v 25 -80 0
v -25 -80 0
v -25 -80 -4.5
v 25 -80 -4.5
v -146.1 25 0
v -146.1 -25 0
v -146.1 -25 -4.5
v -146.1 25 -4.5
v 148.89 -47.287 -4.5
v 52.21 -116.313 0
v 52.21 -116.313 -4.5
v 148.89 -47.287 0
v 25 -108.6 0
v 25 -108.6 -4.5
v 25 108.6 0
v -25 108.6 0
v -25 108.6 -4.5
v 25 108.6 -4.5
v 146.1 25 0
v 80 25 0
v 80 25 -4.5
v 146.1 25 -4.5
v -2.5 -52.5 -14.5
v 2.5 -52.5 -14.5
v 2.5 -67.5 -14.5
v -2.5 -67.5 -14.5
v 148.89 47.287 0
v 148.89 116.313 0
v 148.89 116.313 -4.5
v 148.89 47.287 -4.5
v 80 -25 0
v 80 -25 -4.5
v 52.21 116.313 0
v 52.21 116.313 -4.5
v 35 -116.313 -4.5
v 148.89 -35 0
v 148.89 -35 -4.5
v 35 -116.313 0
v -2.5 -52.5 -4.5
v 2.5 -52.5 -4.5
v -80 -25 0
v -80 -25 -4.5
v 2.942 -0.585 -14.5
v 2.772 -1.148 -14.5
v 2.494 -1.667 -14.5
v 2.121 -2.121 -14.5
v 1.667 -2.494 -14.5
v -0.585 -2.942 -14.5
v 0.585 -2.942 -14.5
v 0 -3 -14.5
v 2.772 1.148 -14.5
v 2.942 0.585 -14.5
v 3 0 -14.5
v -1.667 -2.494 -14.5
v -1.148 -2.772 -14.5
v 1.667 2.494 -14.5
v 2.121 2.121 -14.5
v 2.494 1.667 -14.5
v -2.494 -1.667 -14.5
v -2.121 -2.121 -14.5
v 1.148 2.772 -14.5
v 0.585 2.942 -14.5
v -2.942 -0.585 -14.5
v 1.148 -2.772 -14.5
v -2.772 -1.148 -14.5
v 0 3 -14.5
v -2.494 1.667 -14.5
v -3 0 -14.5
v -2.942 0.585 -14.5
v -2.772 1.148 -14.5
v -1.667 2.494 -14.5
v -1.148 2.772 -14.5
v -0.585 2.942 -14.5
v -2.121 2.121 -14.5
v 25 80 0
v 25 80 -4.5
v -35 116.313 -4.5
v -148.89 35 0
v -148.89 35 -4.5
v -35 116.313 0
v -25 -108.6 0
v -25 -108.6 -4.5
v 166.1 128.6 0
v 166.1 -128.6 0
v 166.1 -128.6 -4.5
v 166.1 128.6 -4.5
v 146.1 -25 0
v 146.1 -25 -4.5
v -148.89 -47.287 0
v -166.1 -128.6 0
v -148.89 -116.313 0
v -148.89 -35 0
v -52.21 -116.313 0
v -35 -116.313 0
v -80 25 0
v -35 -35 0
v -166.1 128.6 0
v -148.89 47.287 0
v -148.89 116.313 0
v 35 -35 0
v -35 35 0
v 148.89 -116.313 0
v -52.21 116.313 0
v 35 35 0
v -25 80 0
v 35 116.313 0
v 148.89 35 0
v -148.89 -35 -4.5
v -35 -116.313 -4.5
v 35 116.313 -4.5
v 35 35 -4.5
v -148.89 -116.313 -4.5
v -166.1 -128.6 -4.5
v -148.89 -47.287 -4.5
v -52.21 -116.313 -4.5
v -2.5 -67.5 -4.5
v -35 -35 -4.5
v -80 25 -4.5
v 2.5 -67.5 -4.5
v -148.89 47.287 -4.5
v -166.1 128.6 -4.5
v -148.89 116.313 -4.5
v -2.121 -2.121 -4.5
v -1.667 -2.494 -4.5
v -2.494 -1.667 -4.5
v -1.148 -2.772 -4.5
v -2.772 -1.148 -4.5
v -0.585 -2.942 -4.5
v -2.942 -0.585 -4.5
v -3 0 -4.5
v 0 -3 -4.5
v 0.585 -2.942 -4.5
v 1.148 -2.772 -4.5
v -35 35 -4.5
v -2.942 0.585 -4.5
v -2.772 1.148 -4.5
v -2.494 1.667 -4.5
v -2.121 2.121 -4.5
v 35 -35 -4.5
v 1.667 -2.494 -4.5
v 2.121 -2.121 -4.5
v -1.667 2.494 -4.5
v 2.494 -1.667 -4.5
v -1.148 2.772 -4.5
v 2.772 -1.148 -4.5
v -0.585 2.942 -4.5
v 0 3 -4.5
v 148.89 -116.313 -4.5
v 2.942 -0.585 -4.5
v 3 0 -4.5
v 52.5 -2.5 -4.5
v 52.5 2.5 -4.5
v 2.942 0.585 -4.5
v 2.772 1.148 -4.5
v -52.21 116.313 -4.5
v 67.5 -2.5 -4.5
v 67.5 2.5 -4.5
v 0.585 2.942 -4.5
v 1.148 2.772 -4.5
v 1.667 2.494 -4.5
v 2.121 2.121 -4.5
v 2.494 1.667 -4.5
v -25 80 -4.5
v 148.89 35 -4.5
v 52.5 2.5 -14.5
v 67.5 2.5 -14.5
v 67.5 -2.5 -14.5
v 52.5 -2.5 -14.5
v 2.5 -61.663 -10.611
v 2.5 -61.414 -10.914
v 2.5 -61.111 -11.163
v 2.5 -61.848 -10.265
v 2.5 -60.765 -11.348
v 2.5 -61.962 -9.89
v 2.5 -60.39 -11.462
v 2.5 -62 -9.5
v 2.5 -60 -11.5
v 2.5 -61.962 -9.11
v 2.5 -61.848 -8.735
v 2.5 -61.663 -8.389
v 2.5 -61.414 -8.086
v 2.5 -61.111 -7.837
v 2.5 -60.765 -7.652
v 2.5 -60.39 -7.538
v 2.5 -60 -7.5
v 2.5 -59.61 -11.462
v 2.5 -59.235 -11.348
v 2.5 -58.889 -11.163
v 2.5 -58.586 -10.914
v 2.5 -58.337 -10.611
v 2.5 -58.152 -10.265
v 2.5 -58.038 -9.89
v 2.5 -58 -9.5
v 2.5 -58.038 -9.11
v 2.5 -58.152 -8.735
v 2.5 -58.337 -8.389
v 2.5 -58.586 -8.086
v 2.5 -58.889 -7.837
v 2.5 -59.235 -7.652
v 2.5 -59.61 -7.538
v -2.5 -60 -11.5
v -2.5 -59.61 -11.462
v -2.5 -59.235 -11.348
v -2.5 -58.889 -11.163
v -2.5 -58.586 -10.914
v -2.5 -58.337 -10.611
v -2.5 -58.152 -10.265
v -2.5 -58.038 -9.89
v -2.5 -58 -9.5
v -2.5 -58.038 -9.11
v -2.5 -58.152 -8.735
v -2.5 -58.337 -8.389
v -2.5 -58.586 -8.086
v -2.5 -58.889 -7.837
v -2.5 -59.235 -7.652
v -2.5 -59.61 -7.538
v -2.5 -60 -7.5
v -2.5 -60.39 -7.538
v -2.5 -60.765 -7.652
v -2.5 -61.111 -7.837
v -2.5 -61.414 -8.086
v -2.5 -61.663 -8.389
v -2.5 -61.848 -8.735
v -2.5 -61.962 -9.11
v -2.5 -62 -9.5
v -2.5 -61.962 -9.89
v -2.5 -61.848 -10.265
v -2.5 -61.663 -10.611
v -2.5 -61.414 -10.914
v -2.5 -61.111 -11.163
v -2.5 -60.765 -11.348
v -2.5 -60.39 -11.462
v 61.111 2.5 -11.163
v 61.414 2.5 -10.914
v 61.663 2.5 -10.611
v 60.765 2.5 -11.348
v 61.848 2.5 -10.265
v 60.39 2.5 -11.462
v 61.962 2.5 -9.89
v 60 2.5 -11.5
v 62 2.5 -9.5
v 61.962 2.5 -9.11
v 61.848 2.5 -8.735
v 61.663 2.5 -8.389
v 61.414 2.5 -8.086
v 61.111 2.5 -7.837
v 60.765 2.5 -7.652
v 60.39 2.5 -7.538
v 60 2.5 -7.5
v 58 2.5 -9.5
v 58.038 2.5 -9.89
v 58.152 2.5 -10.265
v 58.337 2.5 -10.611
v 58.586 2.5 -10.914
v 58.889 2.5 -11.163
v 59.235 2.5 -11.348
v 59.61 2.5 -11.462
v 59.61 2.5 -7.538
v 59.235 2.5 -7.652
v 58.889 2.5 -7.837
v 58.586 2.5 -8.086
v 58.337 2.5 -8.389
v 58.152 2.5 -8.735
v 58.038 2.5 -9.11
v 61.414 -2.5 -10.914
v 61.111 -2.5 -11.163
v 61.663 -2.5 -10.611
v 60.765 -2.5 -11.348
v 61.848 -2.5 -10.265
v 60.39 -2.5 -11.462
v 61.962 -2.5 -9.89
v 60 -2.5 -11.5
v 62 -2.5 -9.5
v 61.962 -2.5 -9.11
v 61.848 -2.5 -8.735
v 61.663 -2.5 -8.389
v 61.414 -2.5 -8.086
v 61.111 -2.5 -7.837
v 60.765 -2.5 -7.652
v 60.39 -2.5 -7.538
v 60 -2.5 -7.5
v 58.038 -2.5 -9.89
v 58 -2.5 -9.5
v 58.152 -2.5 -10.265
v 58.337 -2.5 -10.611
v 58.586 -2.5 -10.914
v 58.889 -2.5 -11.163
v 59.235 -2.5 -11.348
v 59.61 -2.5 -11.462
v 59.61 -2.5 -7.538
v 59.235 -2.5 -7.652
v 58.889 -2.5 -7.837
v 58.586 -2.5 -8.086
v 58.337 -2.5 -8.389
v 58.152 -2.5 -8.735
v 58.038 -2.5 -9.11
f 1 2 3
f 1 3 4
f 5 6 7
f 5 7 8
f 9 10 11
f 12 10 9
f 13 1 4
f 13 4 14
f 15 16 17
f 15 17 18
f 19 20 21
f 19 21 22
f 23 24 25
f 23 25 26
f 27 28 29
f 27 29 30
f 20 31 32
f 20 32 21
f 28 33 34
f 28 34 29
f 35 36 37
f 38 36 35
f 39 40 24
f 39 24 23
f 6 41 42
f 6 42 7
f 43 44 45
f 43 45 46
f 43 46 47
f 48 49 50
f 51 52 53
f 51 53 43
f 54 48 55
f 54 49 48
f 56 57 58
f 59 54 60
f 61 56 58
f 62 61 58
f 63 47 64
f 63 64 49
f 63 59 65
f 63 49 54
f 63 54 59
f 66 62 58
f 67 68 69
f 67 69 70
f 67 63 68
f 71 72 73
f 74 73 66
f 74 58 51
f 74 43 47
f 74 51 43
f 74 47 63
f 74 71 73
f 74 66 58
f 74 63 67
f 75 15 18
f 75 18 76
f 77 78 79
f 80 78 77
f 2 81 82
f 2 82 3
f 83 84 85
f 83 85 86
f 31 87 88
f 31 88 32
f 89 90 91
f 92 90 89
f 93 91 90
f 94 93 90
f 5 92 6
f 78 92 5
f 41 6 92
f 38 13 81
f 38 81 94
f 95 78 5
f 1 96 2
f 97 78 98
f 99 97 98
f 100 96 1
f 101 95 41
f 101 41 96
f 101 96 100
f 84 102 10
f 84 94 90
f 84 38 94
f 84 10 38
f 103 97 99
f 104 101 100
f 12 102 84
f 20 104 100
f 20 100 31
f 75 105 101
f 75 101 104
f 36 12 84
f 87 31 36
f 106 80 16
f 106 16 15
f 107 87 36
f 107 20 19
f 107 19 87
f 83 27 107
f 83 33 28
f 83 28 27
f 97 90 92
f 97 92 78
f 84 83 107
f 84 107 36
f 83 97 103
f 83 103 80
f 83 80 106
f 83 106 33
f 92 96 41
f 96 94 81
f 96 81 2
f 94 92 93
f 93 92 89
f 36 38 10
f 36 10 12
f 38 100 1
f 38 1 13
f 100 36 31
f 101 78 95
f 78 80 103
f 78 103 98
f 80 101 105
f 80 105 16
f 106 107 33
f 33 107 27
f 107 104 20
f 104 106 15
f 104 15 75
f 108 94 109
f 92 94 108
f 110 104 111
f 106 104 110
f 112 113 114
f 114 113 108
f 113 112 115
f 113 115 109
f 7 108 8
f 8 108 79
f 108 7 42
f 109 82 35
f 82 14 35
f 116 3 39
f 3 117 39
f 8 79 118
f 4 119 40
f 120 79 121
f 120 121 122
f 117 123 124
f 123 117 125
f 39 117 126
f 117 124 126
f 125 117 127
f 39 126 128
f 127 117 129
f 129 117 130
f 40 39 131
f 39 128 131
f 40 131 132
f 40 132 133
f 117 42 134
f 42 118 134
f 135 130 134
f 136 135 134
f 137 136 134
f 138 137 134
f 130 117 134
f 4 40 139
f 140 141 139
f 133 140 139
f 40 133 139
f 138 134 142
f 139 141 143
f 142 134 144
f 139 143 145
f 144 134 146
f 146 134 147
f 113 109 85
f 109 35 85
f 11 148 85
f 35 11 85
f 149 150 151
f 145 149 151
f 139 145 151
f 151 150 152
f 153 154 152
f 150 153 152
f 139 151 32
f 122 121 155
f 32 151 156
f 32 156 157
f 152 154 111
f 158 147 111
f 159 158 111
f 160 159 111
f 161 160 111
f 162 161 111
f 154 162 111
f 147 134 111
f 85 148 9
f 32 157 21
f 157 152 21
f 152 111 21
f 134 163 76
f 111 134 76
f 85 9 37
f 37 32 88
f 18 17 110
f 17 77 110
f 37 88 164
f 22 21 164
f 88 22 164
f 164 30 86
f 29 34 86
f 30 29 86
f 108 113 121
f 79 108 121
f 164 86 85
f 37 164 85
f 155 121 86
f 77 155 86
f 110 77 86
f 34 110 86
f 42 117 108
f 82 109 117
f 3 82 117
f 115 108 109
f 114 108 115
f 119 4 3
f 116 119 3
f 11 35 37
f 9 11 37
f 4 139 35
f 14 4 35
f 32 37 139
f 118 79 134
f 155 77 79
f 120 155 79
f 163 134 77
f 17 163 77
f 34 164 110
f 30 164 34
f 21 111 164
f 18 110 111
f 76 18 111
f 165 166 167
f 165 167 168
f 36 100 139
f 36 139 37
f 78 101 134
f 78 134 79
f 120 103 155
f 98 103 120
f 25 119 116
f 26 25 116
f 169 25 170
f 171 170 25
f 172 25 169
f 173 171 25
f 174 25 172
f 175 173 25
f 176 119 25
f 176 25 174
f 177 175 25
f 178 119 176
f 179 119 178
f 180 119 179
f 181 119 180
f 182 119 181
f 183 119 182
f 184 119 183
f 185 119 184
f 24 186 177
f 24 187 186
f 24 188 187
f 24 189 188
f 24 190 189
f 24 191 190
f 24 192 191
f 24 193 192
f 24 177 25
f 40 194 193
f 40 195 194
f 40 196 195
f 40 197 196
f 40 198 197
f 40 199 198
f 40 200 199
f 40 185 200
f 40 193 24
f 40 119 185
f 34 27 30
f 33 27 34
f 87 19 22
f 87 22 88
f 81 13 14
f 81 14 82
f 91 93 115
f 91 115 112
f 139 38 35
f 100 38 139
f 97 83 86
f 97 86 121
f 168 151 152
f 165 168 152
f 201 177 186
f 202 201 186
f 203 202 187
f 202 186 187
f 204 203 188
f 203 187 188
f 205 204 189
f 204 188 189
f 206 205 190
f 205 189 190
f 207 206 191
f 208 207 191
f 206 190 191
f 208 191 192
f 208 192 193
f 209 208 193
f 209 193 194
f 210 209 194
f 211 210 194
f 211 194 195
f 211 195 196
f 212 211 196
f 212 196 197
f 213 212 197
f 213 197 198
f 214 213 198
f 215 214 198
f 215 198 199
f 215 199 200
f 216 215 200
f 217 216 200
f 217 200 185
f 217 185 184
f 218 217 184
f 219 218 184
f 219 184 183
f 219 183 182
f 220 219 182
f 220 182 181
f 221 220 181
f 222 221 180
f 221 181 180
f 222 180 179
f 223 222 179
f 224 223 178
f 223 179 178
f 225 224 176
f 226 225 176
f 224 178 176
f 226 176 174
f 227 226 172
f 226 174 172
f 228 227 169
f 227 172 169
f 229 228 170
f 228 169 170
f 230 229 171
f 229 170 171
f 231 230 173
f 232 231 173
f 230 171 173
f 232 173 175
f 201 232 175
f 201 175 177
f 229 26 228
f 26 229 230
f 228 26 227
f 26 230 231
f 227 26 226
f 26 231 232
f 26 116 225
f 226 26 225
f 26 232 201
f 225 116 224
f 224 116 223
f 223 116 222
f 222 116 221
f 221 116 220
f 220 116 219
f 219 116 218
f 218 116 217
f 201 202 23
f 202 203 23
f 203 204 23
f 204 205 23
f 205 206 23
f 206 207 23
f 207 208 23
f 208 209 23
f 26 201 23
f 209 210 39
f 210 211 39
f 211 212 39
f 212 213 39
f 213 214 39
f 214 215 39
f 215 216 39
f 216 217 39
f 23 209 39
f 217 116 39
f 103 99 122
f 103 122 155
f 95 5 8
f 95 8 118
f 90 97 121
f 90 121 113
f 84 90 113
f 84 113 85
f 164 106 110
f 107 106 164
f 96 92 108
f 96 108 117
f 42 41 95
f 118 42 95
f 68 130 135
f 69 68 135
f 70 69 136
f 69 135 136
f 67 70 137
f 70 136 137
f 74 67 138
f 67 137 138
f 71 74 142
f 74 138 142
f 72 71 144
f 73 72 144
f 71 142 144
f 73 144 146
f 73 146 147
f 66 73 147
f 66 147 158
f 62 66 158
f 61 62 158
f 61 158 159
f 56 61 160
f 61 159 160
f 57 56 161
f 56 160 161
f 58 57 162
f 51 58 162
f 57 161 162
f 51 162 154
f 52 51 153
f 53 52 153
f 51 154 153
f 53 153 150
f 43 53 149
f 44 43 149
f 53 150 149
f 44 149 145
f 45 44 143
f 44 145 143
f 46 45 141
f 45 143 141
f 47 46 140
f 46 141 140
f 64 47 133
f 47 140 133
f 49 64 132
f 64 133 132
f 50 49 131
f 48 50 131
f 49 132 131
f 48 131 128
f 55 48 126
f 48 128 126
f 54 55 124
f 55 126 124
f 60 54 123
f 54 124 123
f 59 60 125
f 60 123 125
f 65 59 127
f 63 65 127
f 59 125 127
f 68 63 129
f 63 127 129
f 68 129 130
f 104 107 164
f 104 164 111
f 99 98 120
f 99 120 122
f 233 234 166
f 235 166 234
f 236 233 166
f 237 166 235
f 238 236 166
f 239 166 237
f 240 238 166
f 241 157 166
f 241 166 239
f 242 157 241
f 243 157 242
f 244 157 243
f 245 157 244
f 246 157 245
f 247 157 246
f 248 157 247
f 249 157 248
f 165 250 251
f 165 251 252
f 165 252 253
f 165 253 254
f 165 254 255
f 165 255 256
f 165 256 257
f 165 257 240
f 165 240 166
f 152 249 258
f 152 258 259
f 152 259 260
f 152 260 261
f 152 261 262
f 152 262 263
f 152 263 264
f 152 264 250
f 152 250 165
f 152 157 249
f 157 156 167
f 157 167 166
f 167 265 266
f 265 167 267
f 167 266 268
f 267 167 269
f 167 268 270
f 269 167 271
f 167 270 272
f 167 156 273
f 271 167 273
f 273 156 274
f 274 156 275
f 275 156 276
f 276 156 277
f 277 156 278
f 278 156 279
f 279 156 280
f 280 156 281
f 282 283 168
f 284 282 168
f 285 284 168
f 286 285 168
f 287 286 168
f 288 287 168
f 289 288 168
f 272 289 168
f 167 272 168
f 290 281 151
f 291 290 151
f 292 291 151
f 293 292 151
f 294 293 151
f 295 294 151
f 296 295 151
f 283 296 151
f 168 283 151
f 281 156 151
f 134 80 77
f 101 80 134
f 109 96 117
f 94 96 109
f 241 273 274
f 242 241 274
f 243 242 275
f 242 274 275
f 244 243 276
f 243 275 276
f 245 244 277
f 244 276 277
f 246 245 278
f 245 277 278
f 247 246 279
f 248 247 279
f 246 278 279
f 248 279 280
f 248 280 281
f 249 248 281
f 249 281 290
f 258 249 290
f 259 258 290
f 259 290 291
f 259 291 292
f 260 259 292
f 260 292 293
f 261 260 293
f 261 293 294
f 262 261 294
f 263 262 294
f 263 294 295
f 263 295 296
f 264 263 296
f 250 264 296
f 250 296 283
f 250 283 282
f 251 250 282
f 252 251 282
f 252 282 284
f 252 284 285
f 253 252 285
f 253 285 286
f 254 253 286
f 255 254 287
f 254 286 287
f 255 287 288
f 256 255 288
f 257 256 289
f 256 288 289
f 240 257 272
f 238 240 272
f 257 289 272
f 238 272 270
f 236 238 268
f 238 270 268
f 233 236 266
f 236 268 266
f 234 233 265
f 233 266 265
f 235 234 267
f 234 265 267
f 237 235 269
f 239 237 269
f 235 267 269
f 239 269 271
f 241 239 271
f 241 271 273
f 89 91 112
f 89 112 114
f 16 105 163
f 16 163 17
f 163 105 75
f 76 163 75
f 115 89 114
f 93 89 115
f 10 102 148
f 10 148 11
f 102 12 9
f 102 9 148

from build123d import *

# Parameters (mm, degrees)
IZIM1_W                     = 50
IZIM1_H                     = 50
IZIM1_H_2                   = 45
IZIM1_W_2                   = 45
Y_KSEKLIK_EKSTR_ZYON2_DEPTH = 4.5
IZIM2_R                     = 3
Y_KSEKLIK_EKSTR_ZYON3_DEPTH = 10
IZIM4_W                     = 15
IZIM4_H                     = 5
IZIM4_W_2                   = 5
IZIM4_H_2                   = 15
Y_KSEKLIK_EKSTR_ZYON5_DEPTH = 10
IZIM5_R                     = 2
KES_EKSTR_ZYON1_DEPTH       = 132.1
IZIM6_R                     = 2
KES_EKSTR_ZYON2_DEPTH       = 169.6


with BuildPart() as part:
    # Çizim1 → Yükseklik-Ekstrüzyon2 (new body)
    with BuildSketch(Plane.XY):
        Polygon((-35, -128.6), (-35, -116.312863708), (-52.209867178, -116.312863708), align=None)
        Polygon((-35, -116.312863708), (-148.890132822, -35), (-148.890132822, -47.287136292), (-52.209867178, -116.312863708), align=None)
        Polygon((-25, -35), (-35, -35), (-35, -116.312863708), (-35, -128.6), (35, -128.6), (35, -116.312863708), (35, -35), (25, -35), (25, -80), (25, -108.6), (-25, -108.6), (-25, -80), align=None)
        Polygon((-148.890132822, -47.287136292), (-166.1, -35), (-166.1, -128.6), (-35, -128.6), (-52.209867178, -116.312863708), (-148.890132822, -116.312863708), align=None)
        Polygon((-148.890132822, -35), (-166.1, -35), (-148.890132822, -47.287136292), align=None)
        Polygon((-35, 25), (-35, 35), (-148.890132822, 35), (-166.1, 35), (-166.1, -35), (-148.890132822, -35), (-35, -35), (-35, -25), (-80, -25), (-146.1, -25), (-146.1, 25), (-80, 25), align=None)
        Polygon((-25, 35), (-35, 35), (-35, 25), (-35, -25), (-35, -35), (-25, -35), (25, -35), (35, -35), (35, -25), (35, 25), (35, 35), (25, 35), align=None)
        Rectangle(IZIM1_W, IZIM1_H, mode=Mode.SUBTRACT)
        with Locations((0, -57.5)):
            Rectangle(IZIM1_W, IZIM1_H_2)
        Rectangle(IZIM1_W, IZIM1_H)
        with Locations((-57.5, 0)):
            Rectangle(IZIM1_W_2, IZIM1_H)
        with Locations((57.5, 0)):
            Rectangle(IZIM1_W_2, IZIM1_H)
        Polygon((148.890132822, 35), (35, 35), (35, 25), (80, 25), (146.1, 25), (146.1, -25), (80, -25), (35, -25), (35, -35), (148.890132822, -35), (166.1, -35), (166.1, 35), align=None)
        Polygon((148.890132822, -47.287136292), (148.890132822, -35), (35, -116.312863708), (52.209867178, -116.312863708), align=None)
        Polygon((148.890132822, -47.287136292), (166.1, -35), (148.890132822, -35), align=None)
        Polygon((166.1, -128.6), (166.1, -35), (148.890132822, -47.287136292), (148.890132822, -116.312863708), (52.209867178, -116.312863708), (35, -128.6), align=None)
        Polygon((52.209867178, -116.312863708), (35, -116.312863708), (35, -128.6), align=None)
        Polygon((52.209867178, 116.312863708), (35, 116.312863708), (148.890132822, 35), (148.890132822, 47.287136292), align=None)
        Polygon((148.890132822, 47.287136292), (148.890132822, 35), (166.1, 35), align=None)
        Polygon((166.1, 128.6), (35, 128.6), (52.209867178, 116.312863708), (148.890132822, 116.312863708), (148.890132822, 47.287136292), (166.1, 35), align=None)
        Polygon((52.209867178, 116.312863708), (35, 128.6), (35, 116.312863708), align=None)
        Polygon((35, 128.6), (-35, 128.6), (-35, 116.312863708), (-35, 35), (-25, 35), (-25, 80), (-25, 108.6), (25, 108.6), (25, 80), (25, 35), (35, 35), (35, 116.312863708), align=None)
        with Locations((0, 57.5)):
            Rectangle(IZIM1_W, IZIM1_H_2)
        Polygon((-35, 116.312863708), (-35, 128.6), (-52.209867178, 116.312863708), align=None)
        Polygon((-35, 116.312863708), (-52.209867178, 116.312863708), (-148.890132822, 47.287136292), (-148.890132822, 35), align=None)
        Polygon((-52.209867178, 116.312863708), (-35, 128.6), (-166.1, 128.6), (-166.1, 35), (-148.890132822, 47.287136292), (-148.890132822, 116.312863708), align=None)
        Polygon((-148.890132822, 35), (-148.890132822, 47.287136292), (-166.1, 35), align=None)
    extrude(amount=-Y_KSEKLIK_EKSTR_ZYON2_DEPTH)

    # Çizim2 → Yükseklik-Ekstrüzyon3 (add)
    with BuildSketch(Plane(origin=(0, 0, -4.5), x_dir=(-1, 0, 0), z_dir=(0, 0, -1))):
        Circle(IZIM2_R)
    extrude(amount=Y_KSEKLIK_EKSTR_ZYON3_DEPTH)

    # Çizim4 → Yükseklik-Ekstrüzyon5 (add)
    with BuildSketch(Plane(origin=(0, 0, -4.5), x_dir=(-1, 0, 0), z_dir=(0, 0, -1))):
        with Locations((-60, 0)):
            Rectangle(IZIM4_W, IZIM4_H)
        with Locations((0, -60)):
            Rectangle(IZIM4_W_2, IZIM4_H_2)
    extrude(amount=Y_KSEKLIK_EKSTR_ZYON5_DEPTH)

    # Çizim5 → Kes-Ekstrüzyon1 (cut, through all)
    with BuildSketch(Plane.XZ.offset(2.5)):
        with Locations((60, -9.5)):
            Circle(IZIM5_R)
        with Locations((60, -18.5)):
            Circle(IZIM5_R)
    extrude(amount=-KES_EKSTR_ZYON1_DEPTH, mode=Mode.SUBTRACT)

    # Çizim6 → Kes-Ekstrüzyon2 (cut, through all)
    with BuildSketch(Plane(origin=(2.5, 0, 0), x_dir=(0, 0, -1), z_dir=(1, 0, 0))):
        with Locations((9.5, -60)):
            Circle(IZIM6_R)
        with Locations((18.5, -60)):
            Circle(IZIM6_R)
    extrude(amount=-KES_EKSTR_ZYON2_DEPTH, mode=Mode.SUBTRACT)


solid = part.part
